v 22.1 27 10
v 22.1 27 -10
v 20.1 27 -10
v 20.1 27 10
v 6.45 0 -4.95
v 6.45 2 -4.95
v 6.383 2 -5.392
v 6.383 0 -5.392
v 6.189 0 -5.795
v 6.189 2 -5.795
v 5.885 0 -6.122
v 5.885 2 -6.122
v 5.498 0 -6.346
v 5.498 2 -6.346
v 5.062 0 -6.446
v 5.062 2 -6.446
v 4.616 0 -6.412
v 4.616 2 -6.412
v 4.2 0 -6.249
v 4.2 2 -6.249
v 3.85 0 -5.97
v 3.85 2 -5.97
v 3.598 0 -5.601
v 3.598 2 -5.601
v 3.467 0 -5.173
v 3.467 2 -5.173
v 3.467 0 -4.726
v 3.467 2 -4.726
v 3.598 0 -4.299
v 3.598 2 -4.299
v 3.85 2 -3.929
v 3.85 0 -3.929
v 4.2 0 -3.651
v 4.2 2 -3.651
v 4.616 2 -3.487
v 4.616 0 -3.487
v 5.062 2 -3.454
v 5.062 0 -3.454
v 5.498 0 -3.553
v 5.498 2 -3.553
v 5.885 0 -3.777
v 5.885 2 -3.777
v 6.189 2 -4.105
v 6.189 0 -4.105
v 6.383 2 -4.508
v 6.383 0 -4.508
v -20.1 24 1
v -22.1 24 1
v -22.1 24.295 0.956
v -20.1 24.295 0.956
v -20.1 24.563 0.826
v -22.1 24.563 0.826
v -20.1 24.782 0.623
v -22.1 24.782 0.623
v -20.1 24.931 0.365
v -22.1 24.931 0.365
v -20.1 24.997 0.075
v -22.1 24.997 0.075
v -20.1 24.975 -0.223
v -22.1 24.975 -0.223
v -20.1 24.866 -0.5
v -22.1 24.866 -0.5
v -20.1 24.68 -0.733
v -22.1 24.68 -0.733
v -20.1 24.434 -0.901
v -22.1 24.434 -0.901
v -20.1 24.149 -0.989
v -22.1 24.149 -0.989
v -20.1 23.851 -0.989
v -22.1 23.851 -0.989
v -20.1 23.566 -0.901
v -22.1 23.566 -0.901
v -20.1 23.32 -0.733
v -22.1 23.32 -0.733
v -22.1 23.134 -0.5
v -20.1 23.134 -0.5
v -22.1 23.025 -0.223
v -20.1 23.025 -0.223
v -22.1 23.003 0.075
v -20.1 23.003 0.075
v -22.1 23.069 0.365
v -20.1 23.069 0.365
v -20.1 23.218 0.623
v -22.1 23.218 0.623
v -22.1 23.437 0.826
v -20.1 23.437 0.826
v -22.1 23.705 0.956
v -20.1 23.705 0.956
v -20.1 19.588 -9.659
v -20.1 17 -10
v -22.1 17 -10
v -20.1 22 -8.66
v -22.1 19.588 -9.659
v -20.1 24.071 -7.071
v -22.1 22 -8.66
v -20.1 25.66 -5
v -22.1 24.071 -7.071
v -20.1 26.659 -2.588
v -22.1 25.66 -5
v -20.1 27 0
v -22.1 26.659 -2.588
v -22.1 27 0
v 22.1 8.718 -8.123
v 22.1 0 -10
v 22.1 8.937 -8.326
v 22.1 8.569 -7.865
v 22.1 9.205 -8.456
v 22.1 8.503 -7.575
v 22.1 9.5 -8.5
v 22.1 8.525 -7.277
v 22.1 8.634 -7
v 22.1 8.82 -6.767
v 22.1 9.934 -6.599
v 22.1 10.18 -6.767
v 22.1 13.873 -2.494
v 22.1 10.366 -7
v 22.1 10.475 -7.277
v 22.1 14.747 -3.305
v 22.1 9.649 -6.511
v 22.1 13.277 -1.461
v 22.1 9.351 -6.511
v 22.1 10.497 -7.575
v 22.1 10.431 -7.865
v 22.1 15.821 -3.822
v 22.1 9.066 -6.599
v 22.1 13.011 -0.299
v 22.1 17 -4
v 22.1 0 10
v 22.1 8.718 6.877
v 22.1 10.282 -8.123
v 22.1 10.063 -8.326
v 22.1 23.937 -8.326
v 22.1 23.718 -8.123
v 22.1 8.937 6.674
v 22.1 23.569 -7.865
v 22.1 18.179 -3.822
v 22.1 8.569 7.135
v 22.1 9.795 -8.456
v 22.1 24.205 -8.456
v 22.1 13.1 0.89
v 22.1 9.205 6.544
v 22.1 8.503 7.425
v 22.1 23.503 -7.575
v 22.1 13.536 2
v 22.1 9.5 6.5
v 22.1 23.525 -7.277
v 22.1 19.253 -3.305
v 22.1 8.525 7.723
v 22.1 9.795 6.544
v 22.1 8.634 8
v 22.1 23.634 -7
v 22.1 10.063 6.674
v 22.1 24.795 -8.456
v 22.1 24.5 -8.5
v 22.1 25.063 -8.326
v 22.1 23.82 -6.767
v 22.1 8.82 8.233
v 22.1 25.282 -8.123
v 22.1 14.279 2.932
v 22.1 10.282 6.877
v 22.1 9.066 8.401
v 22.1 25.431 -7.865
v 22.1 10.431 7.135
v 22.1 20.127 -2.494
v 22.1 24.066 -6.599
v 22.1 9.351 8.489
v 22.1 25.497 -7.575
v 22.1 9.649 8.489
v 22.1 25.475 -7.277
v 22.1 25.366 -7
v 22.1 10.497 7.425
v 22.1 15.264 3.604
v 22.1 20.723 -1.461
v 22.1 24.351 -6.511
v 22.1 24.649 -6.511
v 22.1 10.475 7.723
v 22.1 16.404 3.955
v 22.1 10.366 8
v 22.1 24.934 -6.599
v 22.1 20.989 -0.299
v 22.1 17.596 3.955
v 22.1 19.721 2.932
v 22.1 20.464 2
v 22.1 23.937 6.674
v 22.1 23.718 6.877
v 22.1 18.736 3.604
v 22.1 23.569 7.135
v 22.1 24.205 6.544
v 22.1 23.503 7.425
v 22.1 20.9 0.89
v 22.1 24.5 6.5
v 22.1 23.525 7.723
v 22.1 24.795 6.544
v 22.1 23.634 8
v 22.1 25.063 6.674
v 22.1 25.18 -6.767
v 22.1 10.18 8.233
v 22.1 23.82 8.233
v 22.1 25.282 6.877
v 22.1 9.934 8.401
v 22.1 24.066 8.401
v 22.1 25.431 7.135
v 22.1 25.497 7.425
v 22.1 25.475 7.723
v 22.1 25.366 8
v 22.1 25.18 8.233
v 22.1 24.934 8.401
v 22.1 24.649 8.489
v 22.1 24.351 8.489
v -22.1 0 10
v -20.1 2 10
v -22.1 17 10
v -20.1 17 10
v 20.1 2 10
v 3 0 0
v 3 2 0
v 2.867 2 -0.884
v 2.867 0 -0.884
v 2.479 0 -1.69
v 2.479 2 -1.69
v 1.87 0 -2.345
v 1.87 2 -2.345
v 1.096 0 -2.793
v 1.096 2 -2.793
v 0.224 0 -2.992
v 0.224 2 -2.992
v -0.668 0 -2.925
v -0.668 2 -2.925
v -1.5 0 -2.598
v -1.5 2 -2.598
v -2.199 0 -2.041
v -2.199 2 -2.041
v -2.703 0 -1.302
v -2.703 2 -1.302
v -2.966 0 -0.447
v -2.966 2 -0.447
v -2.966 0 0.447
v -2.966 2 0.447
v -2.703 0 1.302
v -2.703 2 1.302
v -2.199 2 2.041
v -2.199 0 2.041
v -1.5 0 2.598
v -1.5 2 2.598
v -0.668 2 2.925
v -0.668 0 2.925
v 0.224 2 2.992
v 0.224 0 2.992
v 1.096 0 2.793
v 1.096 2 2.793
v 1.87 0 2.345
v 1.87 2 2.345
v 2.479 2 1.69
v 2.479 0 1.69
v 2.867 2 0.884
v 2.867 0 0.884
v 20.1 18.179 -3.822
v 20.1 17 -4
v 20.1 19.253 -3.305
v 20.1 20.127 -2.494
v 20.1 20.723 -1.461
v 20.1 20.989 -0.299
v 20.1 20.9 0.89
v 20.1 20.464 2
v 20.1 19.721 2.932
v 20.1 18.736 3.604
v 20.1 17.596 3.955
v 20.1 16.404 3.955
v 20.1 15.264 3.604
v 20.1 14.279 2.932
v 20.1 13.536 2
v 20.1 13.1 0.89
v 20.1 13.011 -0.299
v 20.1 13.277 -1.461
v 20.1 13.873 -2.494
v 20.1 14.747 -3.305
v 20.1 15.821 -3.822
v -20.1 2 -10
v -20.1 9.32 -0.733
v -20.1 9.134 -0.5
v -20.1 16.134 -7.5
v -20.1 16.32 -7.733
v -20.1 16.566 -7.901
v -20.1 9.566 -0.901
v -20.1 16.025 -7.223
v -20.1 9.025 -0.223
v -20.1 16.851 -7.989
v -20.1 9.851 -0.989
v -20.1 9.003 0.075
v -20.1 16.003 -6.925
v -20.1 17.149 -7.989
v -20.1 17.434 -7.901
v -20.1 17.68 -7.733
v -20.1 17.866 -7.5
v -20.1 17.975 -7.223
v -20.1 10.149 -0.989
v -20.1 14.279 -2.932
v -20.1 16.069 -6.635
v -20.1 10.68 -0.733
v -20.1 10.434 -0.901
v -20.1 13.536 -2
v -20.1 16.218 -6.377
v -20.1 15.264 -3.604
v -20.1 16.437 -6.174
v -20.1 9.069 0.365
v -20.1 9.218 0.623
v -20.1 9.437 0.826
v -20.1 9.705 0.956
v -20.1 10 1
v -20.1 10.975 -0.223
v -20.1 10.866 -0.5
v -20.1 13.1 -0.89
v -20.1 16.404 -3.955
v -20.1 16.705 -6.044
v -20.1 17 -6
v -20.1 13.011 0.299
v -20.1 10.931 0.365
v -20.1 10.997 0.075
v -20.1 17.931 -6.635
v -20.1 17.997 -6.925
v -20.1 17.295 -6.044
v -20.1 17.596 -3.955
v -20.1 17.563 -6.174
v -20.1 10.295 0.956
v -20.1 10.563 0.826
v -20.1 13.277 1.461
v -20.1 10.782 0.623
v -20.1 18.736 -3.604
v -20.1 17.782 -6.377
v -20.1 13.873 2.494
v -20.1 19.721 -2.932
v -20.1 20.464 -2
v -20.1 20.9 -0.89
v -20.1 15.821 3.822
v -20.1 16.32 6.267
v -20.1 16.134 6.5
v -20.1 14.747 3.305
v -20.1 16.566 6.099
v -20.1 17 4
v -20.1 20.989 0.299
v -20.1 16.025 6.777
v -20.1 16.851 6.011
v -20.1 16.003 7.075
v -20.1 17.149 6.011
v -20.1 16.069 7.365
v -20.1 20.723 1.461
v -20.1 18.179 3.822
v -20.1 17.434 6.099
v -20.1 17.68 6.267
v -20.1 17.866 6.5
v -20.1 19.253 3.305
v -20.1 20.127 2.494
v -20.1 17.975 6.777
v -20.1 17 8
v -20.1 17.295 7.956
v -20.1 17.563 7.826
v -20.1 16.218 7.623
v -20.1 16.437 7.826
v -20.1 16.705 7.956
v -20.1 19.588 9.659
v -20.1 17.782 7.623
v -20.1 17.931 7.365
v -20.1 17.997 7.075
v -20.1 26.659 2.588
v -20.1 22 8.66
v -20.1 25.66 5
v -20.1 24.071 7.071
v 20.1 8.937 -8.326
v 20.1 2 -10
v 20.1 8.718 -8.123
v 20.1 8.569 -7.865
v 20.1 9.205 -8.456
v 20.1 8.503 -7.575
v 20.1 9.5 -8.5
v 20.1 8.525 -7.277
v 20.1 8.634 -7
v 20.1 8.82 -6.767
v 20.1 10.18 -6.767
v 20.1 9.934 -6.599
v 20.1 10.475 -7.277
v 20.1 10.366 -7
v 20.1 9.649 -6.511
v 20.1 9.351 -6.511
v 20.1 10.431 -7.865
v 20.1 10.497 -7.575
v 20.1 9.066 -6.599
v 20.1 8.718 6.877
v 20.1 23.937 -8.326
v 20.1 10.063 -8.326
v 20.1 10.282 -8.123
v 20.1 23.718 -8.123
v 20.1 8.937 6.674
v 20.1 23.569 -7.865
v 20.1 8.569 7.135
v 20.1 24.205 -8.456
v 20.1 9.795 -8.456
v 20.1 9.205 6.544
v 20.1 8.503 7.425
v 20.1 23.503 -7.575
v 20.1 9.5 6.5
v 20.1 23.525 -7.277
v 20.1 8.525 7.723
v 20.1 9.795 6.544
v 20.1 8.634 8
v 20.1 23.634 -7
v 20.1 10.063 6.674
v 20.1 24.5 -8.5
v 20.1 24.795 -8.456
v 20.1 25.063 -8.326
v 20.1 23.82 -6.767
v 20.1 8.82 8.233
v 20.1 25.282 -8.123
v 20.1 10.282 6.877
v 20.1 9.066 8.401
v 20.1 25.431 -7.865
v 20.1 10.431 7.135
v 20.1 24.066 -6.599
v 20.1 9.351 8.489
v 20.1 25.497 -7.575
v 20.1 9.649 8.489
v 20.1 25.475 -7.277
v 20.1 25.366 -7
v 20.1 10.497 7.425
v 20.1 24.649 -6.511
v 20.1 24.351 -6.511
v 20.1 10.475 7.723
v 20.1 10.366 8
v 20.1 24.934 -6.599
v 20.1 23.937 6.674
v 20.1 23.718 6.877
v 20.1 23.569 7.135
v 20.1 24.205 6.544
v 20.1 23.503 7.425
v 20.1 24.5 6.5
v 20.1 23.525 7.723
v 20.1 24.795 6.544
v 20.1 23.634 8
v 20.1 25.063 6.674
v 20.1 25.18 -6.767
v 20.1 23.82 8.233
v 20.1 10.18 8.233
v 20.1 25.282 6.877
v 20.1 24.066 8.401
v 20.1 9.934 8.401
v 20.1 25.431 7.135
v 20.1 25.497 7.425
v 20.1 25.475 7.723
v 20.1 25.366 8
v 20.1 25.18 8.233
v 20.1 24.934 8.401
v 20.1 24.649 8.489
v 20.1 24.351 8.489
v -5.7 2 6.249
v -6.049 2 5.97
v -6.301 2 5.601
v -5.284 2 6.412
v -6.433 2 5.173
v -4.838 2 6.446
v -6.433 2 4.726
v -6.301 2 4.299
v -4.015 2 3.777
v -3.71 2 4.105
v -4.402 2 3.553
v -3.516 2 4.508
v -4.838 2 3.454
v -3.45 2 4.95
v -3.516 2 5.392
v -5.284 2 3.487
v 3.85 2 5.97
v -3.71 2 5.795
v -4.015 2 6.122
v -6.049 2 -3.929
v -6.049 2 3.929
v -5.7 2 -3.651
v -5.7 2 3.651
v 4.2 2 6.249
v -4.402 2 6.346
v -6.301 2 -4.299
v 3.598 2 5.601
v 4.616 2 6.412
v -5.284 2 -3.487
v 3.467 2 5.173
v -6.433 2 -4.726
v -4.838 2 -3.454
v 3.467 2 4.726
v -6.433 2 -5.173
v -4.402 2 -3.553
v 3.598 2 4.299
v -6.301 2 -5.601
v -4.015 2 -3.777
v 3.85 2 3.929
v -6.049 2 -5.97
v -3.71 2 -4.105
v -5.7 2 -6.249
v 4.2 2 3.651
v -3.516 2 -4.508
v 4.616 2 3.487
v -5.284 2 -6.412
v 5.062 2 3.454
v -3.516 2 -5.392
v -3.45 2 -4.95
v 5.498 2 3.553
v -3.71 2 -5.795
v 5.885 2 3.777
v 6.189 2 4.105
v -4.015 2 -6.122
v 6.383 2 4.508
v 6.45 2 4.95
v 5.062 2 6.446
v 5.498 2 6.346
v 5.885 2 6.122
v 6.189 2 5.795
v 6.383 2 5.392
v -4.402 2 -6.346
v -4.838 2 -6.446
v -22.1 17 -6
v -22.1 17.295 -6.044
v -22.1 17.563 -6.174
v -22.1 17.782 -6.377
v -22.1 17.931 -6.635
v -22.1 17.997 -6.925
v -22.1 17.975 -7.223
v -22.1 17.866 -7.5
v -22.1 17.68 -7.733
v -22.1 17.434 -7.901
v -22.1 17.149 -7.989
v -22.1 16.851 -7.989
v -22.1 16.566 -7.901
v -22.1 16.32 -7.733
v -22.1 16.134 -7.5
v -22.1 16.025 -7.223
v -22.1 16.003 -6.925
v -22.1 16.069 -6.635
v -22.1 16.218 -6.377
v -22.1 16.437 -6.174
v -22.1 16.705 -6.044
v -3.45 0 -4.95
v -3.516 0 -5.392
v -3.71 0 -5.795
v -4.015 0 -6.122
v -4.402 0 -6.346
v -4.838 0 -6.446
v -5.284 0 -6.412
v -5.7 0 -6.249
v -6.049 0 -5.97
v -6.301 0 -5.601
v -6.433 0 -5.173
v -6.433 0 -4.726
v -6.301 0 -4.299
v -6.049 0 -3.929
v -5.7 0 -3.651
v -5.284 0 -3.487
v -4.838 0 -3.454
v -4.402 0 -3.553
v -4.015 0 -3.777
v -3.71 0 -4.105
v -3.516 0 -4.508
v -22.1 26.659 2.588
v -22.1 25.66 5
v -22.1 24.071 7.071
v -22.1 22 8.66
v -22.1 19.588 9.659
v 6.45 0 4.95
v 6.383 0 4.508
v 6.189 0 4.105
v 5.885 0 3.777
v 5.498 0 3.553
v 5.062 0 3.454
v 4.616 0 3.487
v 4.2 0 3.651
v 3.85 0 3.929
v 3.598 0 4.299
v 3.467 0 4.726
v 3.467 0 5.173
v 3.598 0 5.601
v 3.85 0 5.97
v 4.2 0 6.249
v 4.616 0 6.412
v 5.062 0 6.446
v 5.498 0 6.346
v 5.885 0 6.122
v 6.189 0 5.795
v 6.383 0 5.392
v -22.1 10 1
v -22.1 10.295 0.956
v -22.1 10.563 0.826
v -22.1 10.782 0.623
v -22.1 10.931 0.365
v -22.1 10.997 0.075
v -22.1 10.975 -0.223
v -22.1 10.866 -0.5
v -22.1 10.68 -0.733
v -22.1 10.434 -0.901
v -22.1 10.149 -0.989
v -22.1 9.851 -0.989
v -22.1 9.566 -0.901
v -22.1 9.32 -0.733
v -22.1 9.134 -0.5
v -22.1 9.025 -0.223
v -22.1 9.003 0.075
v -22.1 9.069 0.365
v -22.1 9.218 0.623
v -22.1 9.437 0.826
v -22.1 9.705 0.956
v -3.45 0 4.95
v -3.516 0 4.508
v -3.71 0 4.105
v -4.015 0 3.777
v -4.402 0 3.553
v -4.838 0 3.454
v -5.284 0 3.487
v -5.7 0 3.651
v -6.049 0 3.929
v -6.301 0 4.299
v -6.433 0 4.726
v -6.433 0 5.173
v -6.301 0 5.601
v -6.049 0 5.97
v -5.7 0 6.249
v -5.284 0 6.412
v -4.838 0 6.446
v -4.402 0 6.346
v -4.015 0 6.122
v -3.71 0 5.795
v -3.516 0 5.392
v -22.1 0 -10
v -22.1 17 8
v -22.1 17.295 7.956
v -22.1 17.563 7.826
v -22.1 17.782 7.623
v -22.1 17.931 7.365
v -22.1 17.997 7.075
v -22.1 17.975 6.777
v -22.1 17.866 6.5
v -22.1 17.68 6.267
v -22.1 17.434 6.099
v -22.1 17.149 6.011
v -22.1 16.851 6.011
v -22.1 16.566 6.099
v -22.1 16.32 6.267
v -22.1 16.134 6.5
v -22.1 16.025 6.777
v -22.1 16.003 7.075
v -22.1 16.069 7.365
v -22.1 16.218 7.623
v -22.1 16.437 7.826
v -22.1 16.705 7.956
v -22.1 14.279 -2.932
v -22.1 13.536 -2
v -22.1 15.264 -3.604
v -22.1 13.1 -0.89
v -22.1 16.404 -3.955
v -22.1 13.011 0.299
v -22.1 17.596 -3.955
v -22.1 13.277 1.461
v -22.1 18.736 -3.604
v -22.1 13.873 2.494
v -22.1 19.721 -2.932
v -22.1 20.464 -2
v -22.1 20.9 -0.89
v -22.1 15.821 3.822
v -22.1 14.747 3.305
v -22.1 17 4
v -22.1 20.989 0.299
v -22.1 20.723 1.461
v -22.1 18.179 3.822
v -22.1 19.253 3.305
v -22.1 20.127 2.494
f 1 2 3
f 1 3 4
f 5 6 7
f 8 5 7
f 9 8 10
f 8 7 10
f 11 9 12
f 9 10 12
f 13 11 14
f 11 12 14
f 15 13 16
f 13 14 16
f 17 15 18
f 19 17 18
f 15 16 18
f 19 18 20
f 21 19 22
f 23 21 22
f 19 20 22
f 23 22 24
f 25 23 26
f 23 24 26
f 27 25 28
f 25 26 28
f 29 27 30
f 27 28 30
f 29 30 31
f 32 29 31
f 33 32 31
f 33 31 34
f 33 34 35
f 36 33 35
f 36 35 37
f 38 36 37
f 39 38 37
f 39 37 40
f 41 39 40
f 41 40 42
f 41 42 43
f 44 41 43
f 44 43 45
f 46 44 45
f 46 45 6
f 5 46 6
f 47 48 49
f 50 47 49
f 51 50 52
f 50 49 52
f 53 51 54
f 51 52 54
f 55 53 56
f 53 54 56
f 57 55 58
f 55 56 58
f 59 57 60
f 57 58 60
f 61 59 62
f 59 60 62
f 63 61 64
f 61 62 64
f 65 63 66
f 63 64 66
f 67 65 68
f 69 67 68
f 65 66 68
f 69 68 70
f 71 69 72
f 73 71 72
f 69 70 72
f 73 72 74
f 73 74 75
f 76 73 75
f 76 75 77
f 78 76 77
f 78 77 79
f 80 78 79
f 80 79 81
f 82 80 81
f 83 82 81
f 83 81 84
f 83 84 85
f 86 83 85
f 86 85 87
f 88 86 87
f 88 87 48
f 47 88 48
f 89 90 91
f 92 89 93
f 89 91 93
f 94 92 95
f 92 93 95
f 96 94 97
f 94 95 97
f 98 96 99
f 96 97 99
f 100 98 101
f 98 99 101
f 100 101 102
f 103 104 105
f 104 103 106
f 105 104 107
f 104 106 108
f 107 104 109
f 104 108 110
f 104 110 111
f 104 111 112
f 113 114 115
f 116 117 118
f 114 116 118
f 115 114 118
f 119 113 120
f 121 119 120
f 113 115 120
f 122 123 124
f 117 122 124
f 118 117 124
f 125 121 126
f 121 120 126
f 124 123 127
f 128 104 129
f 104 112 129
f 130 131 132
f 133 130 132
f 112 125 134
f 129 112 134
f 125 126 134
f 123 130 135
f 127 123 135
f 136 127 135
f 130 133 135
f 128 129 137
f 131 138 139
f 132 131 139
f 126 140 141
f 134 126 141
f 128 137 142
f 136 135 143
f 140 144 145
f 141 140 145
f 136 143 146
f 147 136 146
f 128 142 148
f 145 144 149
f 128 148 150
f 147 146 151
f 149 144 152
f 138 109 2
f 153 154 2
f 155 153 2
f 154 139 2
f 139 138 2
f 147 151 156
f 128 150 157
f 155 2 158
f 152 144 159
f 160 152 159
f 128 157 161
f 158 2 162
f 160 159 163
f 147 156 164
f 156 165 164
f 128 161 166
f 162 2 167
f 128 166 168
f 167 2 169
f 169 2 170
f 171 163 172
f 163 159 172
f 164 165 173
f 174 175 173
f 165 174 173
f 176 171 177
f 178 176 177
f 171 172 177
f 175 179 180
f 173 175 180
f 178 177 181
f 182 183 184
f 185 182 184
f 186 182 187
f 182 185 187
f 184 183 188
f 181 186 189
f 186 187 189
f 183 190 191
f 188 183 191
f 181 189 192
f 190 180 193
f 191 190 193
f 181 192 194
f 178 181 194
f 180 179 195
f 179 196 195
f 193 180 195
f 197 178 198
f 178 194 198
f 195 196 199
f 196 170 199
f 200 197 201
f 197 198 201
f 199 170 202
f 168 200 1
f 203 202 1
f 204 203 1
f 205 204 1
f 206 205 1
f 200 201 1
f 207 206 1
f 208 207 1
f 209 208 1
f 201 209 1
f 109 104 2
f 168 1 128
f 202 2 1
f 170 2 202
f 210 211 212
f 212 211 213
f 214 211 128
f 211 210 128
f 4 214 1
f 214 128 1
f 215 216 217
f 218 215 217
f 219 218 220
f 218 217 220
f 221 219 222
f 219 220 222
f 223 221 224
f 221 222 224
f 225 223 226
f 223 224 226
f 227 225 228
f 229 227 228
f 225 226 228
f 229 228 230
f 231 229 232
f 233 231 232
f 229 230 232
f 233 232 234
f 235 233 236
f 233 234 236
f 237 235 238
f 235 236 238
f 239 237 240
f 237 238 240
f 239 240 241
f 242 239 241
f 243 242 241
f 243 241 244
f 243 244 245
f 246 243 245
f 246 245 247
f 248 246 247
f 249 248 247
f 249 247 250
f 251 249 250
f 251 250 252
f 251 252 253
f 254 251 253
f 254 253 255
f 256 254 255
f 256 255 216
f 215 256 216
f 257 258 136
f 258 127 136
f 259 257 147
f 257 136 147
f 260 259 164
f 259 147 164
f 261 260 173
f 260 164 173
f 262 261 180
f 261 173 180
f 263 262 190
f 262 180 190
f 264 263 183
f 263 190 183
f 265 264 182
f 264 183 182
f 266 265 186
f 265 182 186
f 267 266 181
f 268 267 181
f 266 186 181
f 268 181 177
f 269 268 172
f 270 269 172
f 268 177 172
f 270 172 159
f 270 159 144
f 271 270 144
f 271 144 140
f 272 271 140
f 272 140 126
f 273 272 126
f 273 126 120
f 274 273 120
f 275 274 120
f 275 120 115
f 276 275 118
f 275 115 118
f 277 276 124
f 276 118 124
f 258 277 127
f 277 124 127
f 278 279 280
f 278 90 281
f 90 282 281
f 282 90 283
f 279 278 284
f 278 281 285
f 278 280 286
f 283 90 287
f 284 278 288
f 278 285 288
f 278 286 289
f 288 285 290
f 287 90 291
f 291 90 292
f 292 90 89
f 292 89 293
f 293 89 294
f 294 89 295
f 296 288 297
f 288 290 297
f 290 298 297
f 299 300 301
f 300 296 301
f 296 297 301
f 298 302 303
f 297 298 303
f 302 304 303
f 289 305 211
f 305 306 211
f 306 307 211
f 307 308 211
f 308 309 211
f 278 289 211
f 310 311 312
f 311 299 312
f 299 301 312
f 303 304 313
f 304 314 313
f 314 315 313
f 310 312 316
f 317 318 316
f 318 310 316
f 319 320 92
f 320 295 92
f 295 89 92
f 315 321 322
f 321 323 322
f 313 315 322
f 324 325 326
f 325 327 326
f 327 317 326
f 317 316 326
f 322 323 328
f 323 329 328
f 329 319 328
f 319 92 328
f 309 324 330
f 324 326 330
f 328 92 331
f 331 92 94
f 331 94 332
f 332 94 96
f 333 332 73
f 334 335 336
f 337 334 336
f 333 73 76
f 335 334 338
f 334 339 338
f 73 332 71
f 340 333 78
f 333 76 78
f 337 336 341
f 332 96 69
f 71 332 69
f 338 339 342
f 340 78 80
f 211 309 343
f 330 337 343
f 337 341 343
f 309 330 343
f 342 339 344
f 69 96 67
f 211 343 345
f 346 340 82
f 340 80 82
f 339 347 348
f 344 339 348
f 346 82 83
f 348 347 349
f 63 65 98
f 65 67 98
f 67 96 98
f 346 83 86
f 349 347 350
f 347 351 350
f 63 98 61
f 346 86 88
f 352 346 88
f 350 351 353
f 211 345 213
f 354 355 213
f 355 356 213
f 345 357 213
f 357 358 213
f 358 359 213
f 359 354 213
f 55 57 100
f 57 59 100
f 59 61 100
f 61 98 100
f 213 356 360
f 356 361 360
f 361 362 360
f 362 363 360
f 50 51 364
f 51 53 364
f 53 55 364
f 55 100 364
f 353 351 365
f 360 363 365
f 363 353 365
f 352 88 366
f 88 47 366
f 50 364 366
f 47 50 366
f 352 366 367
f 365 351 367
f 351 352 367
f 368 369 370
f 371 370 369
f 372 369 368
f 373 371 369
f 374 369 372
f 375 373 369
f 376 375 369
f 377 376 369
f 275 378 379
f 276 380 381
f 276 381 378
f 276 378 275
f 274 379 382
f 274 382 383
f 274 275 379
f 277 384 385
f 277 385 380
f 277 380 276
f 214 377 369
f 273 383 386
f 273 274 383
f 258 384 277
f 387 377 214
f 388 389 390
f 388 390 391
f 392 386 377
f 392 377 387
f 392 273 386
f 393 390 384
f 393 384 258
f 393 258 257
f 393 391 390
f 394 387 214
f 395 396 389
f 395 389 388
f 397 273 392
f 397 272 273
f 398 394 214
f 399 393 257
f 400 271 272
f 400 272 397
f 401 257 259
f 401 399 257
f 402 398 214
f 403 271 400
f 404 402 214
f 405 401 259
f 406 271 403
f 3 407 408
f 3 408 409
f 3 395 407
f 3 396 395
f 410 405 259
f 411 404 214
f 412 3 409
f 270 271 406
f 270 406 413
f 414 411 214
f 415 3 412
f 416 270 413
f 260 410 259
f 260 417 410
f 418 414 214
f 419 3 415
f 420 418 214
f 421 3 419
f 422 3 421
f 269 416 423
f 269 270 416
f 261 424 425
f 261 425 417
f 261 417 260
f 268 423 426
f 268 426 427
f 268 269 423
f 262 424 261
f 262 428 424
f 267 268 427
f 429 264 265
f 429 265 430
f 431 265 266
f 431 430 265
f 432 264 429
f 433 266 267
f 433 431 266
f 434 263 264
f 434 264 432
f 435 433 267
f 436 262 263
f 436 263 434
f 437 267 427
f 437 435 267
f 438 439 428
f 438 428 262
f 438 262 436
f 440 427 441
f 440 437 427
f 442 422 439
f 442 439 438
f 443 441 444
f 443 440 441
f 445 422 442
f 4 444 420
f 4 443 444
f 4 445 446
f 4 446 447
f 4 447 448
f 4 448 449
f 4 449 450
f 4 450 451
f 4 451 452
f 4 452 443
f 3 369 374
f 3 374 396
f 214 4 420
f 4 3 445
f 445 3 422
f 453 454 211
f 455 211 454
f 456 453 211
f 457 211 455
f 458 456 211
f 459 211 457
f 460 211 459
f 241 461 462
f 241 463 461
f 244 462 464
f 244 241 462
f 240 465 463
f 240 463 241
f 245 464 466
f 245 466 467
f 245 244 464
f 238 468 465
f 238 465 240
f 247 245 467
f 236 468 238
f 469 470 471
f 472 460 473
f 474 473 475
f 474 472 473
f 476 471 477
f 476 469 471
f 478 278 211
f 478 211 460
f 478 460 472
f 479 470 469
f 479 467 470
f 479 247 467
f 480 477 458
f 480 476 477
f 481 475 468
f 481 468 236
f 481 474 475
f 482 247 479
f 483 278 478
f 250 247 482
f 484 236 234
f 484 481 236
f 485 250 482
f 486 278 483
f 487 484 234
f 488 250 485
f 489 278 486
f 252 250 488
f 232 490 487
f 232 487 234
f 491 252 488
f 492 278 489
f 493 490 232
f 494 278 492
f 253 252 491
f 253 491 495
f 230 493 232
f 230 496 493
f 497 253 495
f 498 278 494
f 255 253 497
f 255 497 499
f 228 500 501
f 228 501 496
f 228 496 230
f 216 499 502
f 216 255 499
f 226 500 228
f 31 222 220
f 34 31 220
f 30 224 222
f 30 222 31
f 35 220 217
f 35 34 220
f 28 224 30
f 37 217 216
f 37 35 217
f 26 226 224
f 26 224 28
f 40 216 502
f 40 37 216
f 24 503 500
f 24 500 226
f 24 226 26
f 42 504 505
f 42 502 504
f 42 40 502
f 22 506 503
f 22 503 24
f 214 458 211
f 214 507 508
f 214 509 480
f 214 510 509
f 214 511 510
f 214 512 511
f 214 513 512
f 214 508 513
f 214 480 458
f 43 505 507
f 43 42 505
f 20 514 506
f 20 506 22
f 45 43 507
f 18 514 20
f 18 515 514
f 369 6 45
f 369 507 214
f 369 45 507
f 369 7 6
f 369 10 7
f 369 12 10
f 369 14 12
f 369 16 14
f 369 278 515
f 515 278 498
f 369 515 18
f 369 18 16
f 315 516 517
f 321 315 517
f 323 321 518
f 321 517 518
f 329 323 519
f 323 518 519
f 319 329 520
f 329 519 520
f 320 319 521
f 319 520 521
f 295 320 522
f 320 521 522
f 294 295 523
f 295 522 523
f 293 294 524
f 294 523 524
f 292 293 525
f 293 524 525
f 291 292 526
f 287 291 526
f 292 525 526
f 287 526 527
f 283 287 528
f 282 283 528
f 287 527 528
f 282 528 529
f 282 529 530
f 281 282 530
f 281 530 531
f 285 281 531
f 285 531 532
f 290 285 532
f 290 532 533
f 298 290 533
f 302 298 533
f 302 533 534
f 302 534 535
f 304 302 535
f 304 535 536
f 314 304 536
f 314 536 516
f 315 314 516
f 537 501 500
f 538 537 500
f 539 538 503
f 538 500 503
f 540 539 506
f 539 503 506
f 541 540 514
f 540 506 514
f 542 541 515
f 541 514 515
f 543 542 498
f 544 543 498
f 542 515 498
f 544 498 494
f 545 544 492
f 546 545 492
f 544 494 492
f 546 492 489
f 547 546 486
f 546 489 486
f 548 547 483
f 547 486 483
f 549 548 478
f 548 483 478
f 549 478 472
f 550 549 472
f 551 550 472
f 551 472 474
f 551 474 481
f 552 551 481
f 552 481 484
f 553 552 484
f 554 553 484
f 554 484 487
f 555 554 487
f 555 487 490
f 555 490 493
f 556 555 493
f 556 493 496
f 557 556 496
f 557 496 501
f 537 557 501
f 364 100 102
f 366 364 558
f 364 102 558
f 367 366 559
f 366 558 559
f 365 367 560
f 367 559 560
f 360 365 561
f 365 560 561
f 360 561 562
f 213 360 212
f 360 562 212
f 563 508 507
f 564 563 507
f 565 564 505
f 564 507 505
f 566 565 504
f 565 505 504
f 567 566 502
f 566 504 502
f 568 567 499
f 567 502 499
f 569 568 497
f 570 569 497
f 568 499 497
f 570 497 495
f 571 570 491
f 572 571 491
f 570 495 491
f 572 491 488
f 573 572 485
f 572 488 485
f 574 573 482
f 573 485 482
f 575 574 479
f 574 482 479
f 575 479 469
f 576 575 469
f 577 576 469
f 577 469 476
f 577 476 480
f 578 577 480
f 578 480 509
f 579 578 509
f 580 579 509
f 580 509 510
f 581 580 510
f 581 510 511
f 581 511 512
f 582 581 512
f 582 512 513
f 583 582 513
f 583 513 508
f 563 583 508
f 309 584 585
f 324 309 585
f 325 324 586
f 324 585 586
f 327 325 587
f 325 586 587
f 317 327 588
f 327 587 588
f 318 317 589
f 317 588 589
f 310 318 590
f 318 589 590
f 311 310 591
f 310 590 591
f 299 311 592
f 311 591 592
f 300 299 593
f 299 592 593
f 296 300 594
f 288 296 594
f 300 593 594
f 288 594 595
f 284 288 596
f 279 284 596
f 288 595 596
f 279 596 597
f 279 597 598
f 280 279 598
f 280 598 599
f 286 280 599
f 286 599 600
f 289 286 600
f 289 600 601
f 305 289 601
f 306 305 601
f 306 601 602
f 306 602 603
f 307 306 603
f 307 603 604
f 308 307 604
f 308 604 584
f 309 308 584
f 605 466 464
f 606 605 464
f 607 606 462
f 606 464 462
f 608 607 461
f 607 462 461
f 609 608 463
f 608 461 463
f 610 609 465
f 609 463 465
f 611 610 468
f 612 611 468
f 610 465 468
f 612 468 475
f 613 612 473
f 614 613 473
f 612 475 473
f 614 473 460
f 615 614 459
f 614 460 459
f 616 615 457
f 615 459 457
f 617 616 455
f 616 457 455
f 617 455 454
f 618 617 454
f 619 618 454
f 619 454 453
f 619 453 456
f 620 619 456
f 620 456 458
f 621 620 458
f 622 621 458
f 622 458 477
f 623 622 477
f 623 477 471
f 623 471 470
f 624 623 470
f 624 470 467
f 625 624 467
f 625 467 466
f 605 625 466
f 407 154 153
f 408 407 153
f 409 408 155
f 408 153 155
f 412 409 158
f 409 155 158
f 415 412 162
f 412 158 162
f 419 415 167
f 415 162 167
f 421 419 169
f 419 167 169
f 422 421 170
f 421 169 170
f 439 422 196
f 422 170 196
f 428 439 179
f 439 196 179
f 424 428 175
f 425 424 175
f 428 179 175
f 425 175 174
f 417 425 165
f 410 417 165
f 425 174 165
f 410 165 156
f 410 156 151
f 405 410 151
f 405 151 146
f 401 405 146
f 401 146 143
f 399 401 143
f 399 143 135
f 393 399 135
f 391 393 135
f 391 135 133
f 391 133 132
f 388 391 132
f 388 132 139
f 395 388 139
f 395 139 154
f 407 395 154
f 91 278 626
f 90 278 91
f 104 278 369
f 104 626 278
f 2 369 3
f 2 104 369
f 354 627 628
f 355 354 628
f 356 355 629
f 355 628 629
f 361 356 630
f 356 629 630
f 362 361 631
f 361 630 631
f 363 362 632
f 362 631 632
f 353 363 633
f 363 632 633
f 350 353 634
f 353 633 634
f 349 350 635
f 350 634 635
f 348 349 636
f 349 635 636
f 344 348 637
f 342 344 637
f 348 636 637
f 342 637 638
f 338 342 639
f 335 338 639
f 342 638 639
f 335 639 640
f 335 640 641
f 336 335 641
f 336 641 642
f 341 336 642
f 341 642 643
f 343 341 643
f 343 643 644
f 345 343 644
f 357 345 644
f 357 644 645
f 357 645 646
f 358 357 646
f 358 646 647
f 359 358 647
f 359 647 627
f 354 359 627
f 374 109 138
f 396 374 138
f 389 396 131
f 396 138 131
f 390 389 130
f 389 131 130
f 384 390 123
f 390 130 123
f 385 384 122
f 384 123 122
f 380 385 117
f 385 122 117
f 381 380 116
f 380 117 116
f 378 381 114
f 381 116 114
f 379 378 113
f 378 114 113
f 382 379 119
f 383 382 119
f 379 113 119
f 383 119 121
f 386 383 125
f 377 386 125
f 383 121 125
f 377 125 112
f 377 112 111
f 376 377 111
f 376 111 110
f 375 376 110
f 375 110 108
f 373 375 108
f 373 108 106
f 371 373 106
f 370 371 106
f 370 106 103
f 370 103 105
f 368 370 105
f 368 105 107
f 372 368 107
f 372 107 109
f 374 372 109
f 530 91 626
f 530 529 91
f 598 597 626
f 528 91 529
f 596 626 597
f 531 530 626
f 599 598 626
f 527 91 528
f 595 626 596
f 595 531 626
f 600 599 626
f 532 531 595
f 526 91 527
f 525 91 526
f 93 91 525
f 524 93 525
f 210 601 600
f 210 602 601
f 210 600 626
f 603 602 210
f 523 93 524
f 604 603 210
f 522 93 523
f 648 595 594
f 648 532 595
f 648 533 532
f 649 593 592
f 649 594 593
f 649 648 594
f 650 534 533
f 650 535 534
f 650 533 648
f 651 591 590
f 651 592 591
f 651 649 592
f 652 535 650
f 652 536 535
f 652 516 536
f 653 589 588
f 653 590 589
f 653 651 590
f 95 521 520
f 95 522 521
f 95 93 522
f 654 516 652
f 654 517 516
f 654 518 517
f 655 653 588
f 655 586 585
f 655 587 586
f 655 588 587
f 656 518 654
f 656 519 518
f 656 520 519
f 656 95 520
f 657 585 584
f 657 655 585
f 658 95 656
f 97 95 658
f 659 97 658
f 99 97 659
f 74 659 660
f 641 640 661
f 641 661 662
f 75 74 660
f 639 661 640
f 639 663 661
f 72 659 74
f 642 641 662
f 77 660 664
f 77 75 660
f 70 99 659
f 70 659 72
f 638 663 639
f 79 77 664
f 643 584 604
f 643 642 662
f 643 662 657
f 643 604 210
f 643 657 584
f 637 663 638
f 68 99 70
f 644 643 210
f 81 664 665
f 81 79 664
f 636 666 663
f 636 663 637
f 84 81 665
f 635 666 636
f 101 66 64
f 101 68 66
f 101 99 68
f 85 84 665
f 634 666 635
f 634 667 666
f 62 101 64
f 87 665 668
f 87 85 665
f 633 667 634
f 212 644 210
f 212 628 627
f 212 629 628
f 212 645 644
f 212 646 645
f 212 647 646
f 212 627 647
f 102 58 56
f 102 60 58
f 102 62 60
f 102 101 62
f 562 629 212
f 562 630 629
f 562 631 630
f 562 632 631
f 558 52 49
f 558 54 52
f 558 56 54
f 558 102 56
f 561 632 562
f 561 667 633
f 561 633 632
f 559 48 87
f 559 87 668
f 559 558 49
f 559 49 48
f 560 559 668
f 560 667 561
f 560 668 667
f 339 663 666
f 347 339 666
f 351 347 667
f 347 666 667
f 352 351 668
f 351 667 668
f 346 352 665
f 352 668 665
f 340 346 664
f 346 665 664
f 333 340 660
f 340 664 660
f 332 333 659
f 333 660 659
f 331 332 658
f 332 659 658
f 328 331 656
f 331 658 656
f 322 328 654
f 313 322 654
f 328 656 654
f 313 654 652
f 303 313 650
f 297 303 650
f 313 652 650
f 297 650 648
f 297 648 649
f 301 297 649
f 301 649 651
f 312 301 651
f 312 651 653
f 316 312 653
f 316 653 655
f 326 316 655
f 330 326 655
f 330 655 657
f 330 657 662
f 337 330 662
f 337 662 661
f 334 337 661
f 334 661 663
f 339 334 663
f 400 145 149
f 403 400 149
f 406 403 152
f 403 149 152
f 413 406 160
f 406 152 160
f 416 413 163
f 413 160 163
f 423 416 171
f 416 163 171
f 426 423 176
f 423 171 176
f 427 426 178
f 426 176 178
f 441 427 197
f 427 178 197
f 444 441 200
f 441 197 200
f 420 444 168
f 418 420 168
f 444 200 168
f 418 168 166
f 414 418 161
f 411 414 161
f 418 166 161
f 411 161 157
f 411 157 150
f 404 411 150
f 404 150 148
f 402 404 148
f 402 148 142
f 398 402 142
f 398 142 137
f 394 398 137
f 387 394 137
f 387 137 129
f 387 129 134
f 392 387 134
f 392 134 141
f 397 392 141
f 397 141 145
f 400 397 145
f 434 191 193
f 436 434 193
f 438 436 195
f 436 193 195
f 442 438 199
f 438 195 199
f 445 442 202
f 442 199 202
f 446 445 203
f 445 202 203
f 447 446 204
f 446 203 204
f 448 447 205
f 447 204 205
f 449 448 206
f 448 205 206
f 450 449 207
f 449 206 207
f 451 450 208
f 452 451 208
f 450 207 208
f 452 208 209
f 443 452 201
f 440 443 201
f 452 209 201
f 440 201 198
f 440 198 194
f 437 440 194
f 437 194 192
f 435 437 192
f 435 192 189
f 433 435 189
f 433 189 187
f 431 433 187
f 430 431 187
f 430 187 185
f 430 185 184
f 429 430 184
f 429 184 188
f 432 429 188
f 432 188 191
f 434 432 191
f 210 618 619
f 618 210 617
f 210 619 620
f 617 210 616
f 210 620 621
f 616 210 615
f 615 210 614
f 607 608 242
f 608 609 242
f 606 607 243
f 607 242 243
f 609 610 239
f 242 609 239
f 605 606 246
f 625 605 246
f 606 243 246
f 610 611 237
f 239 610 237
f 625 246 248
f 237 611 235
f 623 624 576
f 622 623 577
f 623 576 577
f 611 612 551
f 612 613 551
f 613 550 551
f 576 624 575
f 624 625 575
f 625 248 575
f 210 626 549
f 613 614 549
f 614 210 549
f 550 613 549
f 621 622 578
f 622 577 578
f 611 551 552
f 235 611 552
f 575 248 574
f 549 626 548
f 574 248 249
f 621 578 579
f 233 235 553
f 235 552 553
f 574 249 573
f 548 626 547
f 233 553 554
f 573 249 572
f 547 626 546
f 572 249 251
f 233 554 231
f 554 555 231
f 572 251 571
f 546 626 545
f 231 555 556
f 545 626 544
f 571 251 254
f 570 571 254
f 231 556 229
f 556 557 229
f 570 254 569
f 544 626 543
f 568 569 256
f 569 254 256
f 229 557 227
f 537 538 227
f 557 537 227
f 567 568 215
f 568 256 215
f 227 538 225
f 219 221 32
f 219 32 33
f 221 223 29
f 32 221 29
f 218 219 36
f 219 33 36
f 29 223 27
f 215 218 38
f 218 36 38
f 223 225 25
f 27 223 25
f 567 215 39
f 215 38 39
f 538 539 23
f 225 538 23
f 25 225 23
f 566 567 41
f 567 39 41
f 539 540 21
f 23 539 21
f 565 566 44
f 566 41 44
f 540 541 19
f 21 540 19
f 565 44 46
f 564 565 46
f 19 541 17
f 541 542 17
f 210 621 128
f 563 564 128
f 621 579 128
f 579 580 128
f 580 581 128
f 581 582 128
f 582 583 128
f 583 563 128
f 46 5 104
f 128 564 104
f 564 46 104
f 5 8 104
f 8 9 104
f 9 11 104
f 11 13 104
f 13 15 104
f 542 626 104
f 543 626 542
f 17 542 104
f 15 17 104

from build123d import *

# Parameters (mm, degrees)
SKETCH_1_W          = 44.2
SKETCH_1_H          = 20
EXTRUDE_1_DEPTH     = 2
CUT_EXTRUDE_1_REACH = 4
SKETCH_2_R          = 3
SKETCH_2_R_2        = 1.5
SKETCH_3_W          = 20
SKETCH_3_H          = 25
EXTRUDE_2_DEPTH     = 2
CUT_EXTRUDE_2_REACH = 46.2
SKETCH_4_R          = 4
SKETCH_4_R_2        = 1
CUT_EXTRUDE_3_REACH = 46.2
SKETCH_5_R          = 4
SKETCH_5_R_2        = 1


with BuildPart() as part:
    # 草图1 → 凸台-拉伸1 (new body)
    with BuildSketch(Plane(origin=(0, 0, 0), x_dir=(1, 0, 0), z_dir=(0, 1, 0))):
        Rectangle(SKETCH_1_W, SKETCH_1_H)
    extrude(amount=EXTRUDE_1_DEPTH)

    # 草图2 → 切除-拉伸1 (cut, up to next)
    with BuildSketch(Plane(origin=(0, 2, 0), x_dir=(1, 0, 0), z_dir=(0, 1, 0)), mode=Mode.PRIVATE) as cut_extrude_1_sk1:
        Circle(SKETCH_2_R)
    cut_extrude_1_tool1 = extrude(cut_extrude_1_sk1.sketch, amount=-CUT_EXTRUDE_1_REACH, mode=Mode.PRIVATE) & part.part
    add(cut_extrude_1_tool1.solids().sort_by_distance((0, 2, 0))[0], mode=Mode.SUBTRACT)
    # 草图2 → 切除-拉伸1 (cut, up to next)
    with BuildSketch(Plane(origin=(0, 2, 0), x_dir=(1, 0, 0), z_dir=(0, 1, 0)), mode=Mode.PRIVATE) as cut_extrude_1_sk2:
        with Locations((4.949747468, -4.949747468)):
            Circle(SKETCH_2_R_2)
    cut_extrude_1_tool2 = extrude(cut_extrude_1_sk2.sketch, amount=-CUT_EXTRUDE_1_REACH, mode=Mode.PRIVATE) & part.part
    add(cut_extrude_1_tool2.solids().sort_by_distance((4.949747, 2, 4.949747))[0], mode=Mode.SUBTRACT)
    # 草图2 → 切除-拉伸1 (cut, up to next)
    with BuildSketch(Plane(origin=(0, 2, 0), x_dir=(1, 0, 0), z_dir=(0, 1, 0)), mode=Mode.PRIVATE) as cut_extrude_1_sk3:
        with Locations((-4.949747468, -4.949747468)):
            Circle(SKETCH_2_R_2)
    cut_extrude_1_tool3 = extrude(cut_extrude_1_sk3.sketch, amount=-CUT_EXTRUDE_1_REACH, mode=Mode.PRIVATE) & part.part
    add(cut_extrude_1_tool3.solids().sort_by_distance((-4.949747, 2, 4.949747))[0], mode=Mode.SUBTRACT)
    # 草图2 → 切除-拉伸1 (cut, up to next)
    with BuildSketch(Plane(origin=(0, 2, 0), x_dir=(1, 0, 0), z_dir=(0, 1, 0)), mode=Mode.PRIVATE) as cut_extrude_1_sk4:
        with Locations((-4.949747468, 4.949747468)):
            Circle(SKETCH_2_R_2)
    cut_extrude_1_tool4 = extrude(cut_extrude_1_sk4.sketch, amount=-CUT_EXTRUDE_1_REACH, mode=Mode.PRIVATE) & part.part
    add(cut_extrude_1_tool4.solids().sort_by_distance((-4.949747, 2, -4.949747))[0], mode=Mode.SUBTRACT)
    # 草图2 → 切除-拉伸1 (cut, up to next)
    with BuildSketch(Plane(origin=(0, 2, 0), x_dir=(1, 0, 0), z_dir=(0, 1, 0)), mode=Mode.PRIVATE) as cut_extrude_1_sk5:
        with Locations((4.949747468, 4.949747468)):
            Circle(SKETCH_2_R_2)
    cut_extrude_1_tool5 = extrude(cut_extrude_1_sk5.sketch, amount=-CUT_EXTRUDE_1_REACH, mode=Mode.PRIVATE) & part.part
    add(cut_extrude_1_tool5.solids().sort_by_distance((4.949747, 2, -4.949747))[0], mode=Mode.SUBTRACT)

    # 草图3 → 凸台-拉伸2 (add)
    with BuildSketch(Plane.ZY.offset(22.1)):
        with Locations((0, 14.5)):
            Rectangle(SKETCH_3_W, SKETCH_3_H)
    extrude_2 = extrude(amount=-EXTRUDE_2_DEPTH)

    # 镜向2: 凸台-拉伸2 across plane
    add(extrude_2.mirror(Plane.ZY))

    # 草图4 → 切除-拉伸2 (cut, up to next)
    with BuildSketch(Plane.ZY.offset(22.1), mode=Mode.PRIVATE) as cut_extrude_2_sk1:
        with BuildLine():
            ThreePointArc((-10, 17), (-7.071067806, 24.071067818), (1.6e-08, 27))
            Line((1.6e-08, 27), (-10, 27))
            Line((-10, 27), (-10, 17))
        make_face()
    cut_extrude_2_tool1 = extrude(cut_extrude_2_sk1.sketch, amount=-CUT_EXTRUDE_2_REACH, mode=Mode.PRIVATE) & part.part
    add(cut_extrude_2_tool1.solids().sort_by_distance((-22.1, 24.766321, -7.766321))[0], mode=Mode.SUBTRACT)
    # 草图4 → 切除-拉伸2 (cut, up to next)
    with BuildSketch(Plane.ZY.offset(22.1), mode=Mode.PRIVATE) as cut_extrude_2_sk2:
        with BuildLine():
            Line((10, 17), (10, 27))
            Line((10, 27), (1.6e-08, 27))
            ThreePointArc((1.6e-08, 27), (7.071067818, 24.071067806), (10, 17))
        make_face()
    cut_extrude_2_tool2 = extrude(cut_extrude_2_sk2.sketch, amount=-CUT_EXTRUDE_2_REACH, mode=Mode.PRIVATE) & part.part
    add(cut_extrude_2_tool2.solids().sort_by_distance((-22.1, 24.766321, 7.766321))[0], mode=Mode.SUBTRACT)
    # 草图4 → 切除-拉伸2 (cut, up to next)
    with BuildSketch(Plane.ZY.offset(22.1), mode=Mode.PRIVATE) as cut_extrude_2_sk3:
        with Locations((0, 17)):
            Circle(SKETCH_4_R)
    cut_extrude_2_tool3 = extrude(cut_extrude_2_sk3.sketch, amount=-CUT_EXTRUDE_2_REACH, mode=Mode.PRIVATE) & part.part
    add(cut_extrude_2_tool3.solids().sort_by_distance((-22.1, 17, 0))[0], mode=Mode.SUBTRACT)
    # 草图4 → 切除-拉伸2 (cut, up to next)
    with BuildSketch(Plane.ZY.offset(22.1), mode=Mode.PRIVATE) as cut_extrude_2_sk4:
        with Locations((0, 24)):
            Circle(SKETCH_4_R_2)
    cut_extrude_2_tool4 = extrude(cut_extrude_2_sk4.sketch, amount=-CUT_EXTRUDE_2_REACH, mode=Mode.PRIVATE) & part.part
    add(cut_extrude_2_tool4.solids().sort_by_distance((-22.1, 24, 0))[0], mode=Mode.SUBTRACT)
    # 草图4 → 切除-拉伸2 (cut, up to next)
    with BuildSketch(Plane.ZY.offset(22.1), mode=Mode.PRIVATE) as cut_extrude_2_sk5:
        with Locations((7, 17)):
            Circle(SKETCH_4_R_2)
    cut_extrude_2_tool5 = extrude(cut_extrude_2_sk5.sketch, amount=-CUT_EXTRUDE_2_REACH, mode=Mode.PRIVATE) & part.part
    add(cut_extrude_2_tool5.solids().sort_by_distance((-22.1, 17, 7))[0], mode=Mode.SUBTRACT)
    # 草图4 → 切除-拉伸2 (cut, up to next)
    with BuildSketch(Plane.ZY.offset(22.1), mode=Mode.PRIVATE) as cut_extrude_2_sk6:
        with Locations((0, 10)):
            Circle(SKETCH_4_R_2)
    cut_extrude_2_tool6 = extrude(cut_extrude_2_sk6.sketch, amount=-CUT_EXTRUDE_2_REACH, mode=Mode.PRIVATE) & part.part
    add(cut_extrude_2_tool6.solids().sort_by_distance((-22.1, 10, 0))[0], mode=Mode.SUBTRACT)
    # 草图4 → 切除-拉伸2 (cut, up to next)
    with BuildSketch(Plane.ZY.offset(22.1), mode=Mode.PRIVATE) as cut_extrude_2_sk7:
        with Locations((-7, 17)):
            Circle(SKETCH_4_R_2)
    cut_extrude_2_tool7 = extrude(cut_extrude_2_sk7.sketch, amount=-CUT_EXTRUDE_2_REACH, mode=Mode.PRIVATE) & part.part
    add(cut_extrude_2_tool7.solids().sort_by_distance((-22.1, 17, -7))[0], mode=Mode.SUBTRACT)

    # 草图5 → 切除-拉伸3 (cut, up to next)
    with BuildSketch(Plane(origin=(22.1, 0, 0), x_dir=(0, 0, -1), z_dir=(1, 0, 0)), mode=Mode.PRIVATE) as cut_extrude_3_sk1:
        with Locations((0, 17)):
            Circle(SKETCH_5_R)
    cut_extrude_3_tool1 = extrude(cut_extrude_3_sk1.sketch, amount=-CUT_EXTRUDE_3_REACH, mode=Mode.PRIVATE) & part.part
    add(cut_extrude_3_tool1.solids().sort_by_distance((22.1, 17, 0))[0], mode=Mode.SUBTRACT)
    # 草图5 → 切除-拉伸3 (cut, up to next)
    with BuildSketch(Plane(origin=(22.1, 0, 0), x_dir=(0, 0, -1), z_dir=(1, 0, 0)), mode=Mode.PRIVATE) as cut_extrude_3_sk2:
        with Locations((-7.5, 24.5)):
            Circle(SKETCH_5_R_2)
    cut_extrude_3_tool2 = extrude(cut_extrude_3_sk2.sketch, amount=-CUT_EXTRUDE_3_REACH, mode=Mode.PRIVATE) & part.part
    add(cut_extrude_3_tool2.solids().sort_by_distance((22.1, 24.5, 7.5))[0], mode=Mode.SUBTRACT)
    # 草图5 → 切除-拉伸3 (cut, up to next)
    with BuildSketch(Plane(origin=(22.1, 0, 0), x_dir=(0, 0, -1), z_dir=(1, 0, 0)), mode=Mode.PRIVATE) as cut_extrude_3_sk3:
        with Locations((7.5, 24.5)):
            Circle(SKETCH_5_R_2)
    cut_extrude_3_tool3 = extrude(cut_extrude_3_sk3.sketch, amount=-CUT_EXTRUDE_3_REACH, mode=Mode.PRIVATE) & part.part
    add(cut_extrude_3_tool3.solids().sort_by_distance((22.1, 24.5, -7.5))[0], mode=Mode.SUBTRACT)
    # 草图5 → 切除-拉伸3 (cut, up to next)
    with BuildSketch(Plane(origin=(22.1, 0, 0), x_dir=(0, 0, -1), z_dir=(1, 0, 0)), mode=Mode.PRIVATE) as cut_extrude_3_sk4:
        with Locations((7.5, 9.5)):
            Circle(SKETCH_5_R_2)
    cut_extrude_3_tool4 = extrude(cut_extrude_3_sk4.sketch, amount=-CUT_EXTRUDE_3_REACH, mode=Mode.PRIVATE) & part.part
    add(cut_extrude_3_tool4.solids().sort_by_distance((22.1, 9.5, -7.5))[0], mode=Mode.SUBTRACT)
    # 草图5 → 切除-拉伸3 (cut, up to next)
    with BuildSketch(Plane(origin=(22.1, 0, 0), x_dir=(0, 0, -1), z_dir=(1, 0, 0)), mode=Mode.PRIVATE) as cut_extrude_3_sk5:
        with Locations((-7.5, 9.5)):
            Circle(SKETCH_5_R_2)
    cut_extrude_3_tool5 = extrude(cut_extrude_3_sk5.sketch, amount=-CUT_EXTRUDE_3_REACH, mode=Mode.PRIVATE) & part.part
    add(cut_extrude_3_tool5.solids().sort_by_distance((22.1, 9.5, 7.5))[0], mode=Mode.SUBTRACT)


solid = part.part
